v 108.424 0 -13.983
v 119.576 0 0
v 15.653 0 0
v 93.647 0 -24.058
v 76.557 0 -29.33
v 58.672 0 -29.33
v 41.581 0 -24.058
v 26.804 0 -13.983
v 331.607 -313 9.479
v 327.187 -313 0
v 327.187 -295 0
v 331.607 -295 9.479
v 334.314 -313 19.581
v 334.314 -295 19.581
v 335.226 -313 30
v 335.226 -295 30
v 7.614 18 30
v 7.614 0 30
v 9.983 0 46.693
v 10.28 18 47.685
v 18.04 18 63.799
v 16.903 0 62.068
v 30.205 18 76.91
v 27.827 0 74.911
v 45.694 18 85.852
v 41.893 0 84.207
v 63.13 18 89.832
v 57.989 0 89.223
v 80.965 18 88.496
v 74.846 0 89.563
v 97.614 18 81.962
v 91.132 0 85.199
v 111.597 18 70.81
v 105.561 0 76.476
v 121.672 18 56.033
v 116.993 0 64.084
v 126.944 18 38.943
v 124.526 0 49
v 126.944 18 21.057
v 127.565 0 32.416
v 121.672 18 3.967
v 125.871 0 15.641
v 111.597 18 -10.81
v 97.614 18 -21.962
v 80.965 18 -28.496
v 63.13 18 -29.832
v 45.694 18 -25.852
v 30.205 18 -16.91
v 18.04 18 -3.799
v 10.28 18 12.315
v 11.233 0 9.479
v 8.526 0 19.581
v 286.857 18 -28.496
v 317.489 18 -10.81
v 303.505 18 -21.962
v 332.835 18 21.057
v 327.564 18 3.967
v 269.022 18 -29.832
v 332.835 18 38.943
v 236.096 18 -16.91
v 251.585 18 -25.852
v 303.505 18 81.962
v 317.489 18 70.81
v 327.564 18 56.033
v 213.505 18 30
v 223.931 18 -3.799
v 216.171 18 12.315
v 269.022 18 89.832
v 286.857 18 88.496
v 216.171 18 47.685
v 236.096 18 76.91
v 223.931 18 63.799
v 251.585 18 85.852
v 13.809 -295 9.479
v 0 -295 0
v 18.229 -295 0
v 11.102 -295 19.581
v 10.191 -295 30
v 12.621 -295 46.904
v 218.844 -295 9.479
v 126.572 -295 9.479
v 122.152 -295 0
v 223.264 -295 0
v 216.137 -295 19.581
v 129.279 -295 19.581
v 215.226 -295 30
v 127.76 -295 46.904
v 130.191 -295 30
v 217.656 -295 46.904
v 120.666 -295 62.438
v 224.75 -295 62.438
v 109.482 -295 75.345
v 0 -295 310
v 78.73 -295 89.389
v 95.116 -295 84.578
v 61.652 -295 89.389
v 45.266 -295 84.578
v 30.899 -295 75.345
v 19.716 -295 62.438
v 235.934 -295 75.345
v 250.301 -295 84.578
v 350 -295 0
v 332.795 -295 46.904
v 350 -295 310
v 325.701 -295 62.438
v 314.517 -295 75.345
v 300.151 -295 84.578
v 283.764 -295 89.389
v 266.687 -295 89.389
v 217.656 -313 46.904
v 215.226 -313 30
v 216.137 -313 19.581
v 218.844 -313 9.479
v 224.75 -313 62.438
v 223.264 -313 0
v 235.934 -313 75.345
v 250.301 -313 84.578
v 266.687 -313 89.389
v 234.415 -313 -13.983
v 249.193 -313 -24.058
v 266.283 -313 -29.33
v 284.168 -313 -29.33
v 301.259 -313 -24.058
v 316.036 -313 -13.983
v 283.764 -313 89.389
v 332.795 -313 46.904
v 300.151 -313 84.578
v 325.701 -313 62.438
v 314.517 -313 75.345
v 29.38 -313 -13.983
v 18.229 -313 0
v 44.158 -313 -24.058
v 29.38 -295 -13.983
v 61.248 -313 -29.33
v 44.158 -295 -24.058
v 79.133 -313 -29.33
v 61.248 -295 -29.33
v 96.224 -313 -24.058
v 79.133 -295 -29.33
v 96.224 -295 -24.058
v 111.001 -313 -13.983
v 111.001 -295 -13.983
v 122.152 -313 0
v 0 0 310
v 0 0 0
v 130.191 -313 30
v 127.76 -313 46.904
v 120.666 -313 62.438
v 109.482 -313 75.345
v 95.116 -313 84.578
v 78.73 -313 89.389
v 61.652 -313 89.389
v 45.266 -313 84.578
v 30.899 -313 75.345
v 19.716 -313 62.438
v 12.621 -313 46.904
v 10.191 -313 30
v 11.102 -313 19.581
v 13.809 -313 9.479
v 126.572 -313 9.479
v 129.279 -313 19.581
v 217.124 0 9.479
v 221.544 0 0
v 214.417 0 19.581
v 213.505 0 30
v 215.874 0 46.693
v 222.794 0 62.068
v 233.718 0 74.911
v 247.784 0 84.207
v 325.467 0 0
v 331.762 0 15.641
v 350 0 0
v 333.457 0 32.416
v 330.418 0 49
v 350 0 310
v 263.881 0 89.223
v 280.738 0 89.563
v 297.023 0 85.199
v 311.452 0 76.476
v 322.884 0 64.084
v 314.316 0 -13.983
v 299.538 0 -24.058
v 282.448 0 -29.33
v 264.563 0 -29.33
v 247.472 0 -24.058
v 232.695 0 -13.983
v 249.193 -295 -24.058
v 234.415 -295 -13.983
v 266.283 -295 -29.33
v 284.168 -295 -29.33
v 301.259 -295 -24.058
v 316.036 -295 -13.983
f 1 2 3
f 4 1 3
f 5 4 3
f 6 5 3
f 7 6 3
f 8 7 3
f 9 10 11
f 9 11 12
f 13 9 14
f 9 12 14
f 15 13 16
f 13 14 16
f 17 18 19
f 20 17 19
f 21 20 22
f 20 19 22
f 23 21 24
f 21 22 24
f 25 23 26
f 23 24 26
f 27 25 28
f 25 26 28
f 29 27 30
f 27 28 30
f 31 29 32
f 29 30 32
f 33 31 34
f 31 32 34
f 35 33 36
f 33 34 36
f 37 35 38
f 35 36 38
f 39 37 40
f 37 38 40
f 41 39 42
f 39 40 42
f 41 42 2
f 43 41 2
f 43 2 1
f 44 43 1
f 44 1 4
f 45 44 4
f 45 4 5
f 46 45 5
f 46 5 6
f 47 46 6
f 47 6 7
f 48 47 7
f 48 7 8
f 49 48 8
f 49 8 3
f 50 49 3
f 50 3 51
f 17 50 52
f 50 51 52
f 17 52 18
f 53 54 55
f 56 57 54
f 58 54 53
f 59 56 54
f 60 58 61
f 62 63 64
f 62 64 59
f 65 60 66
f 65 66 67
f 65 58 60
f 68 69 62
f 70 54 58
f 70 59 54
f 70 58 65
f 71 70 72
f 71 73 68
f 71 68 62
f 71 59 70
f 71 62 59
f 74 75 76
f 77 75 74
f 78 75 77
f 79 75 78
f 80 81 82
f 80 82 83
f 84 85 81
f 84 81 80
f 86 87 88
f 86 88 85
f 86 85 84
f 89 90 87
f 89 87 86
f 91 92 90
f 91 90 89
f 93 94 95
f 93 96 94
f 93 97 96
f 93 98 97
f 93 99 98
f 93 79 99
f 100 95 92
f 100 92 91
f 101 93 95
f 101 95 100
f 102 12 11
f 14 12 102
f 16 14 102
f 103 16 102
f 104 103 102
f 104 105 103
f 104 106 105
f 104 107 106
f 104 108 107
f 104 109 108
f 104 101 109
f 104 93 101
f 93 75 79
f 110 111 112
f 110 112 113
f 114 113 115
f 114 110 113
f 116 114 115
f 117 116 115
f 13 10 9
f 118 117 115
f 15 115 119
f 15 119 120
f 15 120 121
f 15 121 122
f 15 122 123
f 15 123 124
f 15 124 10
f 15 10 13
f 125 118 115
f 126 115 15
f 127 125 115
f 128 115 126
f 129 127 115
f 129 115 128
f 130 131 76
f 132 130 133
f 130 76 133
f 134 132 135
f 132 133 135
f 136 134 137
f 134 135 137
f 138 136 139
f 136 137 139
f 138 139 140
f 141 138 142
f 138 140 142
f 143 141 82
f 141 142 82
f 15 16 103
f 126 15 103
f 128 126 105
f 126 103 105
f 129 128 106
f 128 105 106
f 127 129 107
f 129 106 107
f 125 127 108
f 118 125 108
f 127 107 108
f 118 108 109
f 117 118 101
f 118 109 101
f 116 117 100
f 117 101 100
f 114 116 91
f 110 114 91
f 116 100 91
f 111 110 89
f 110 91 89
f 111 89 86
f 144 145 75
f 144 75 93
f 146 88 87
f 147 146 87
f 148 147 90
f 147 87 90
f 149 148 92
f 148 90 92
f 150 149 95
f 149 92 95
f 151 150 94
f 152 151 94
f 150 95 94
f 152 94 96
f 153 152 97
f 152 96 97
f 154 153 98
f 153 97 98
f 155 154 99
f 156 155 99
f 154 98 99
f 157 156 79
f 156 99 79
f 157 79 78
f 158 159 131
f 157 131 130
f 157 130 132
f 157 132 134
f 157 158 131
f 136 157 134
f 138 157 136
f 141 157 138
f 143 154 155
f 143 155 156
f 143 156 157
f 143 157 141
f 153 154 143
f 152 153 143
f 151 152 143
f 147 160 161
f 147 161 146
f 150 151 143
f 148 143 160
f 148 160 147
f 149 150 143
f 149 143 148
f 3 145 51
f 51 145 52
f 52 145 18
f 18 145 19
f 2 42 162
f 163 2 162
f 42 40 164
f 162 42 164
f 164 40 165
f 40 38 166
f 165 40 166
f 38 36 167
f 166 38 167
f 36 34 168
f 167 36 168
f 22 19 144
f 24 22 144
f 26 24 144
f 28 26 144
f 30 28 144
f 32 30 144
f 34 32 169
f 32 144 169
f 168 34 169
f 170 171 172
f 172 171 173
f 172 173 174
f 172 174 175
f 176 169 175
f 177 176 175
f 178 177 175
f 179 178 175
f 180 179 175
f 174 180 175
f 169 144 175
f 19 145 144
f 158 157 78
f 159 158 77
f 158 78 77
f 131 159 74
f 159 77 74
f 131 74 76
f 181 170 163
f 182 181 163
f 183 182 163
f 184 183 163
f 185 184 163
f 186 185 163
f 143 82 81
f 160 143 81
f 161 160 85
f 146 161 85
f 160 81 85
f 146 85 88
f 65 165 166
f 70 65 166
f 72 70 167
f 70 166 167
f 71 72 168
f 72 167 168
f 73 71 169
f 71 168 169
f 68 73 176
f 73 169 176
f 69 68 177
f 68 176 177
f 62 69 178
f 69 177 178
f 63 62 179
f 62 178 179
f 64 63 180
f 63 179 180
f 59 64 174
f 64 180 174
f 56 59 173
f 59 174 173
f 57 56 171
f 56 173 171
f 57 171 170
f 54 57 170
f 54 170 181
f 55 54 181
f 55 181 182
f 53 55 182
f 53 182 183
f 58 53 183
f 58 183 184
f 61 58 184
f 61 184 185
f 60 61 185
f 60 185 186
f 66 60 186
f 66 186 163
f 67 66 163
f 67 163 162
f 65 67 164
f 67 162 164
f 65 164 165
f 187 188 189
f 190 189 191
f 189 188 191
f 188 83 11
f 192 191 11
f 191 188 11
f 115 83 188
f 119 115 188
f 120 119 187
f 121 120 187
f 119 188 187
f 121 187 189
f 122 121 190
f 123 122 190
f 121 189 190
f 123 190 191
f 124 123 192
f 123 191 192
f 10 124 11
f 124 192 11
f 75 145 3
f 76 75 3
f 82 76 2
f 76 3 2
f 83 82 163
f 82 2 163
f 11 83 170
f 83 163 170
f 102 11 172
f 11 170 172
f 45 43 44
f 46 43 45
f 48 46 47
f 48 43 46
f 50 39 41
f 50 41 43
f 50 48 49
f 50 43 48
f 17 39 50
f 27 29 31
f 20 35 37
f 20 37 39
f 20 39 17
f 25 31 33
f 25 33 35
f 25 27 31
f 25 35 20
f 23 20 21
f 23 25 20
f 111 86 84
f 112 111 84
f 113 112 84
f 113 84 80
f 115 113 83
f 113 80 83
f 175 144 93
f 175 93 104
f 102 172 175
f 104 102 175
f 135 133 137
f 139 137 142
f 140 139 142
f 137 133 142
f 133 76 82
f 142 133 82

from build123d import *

# Parameters (mm, degrees)
F0_W     = 350
F0_H     = 310
F1_DEPTH = 295
F3_DEPTH = 18
F5_DEPTH = 18


with BuildPart() as f1:
    # F0 (on Front) → F1 (new body)
    with BuildSketch(Plane.XZ):
        with Locations((175, 155)):
            Rectangle(F0_W, F0_H)
    extrude(amount=F1_DEPTH)

    # F2 (on face) → F3 (join)
    with BuildSketch(Plane.XZ.offset(295)):
        with BuildLine():
            ThreePointArc((18.2292630883, 0), (70.1907873154, -30), (122.1523115424, 0))
            Line((122.1523115424, 0), (18.2292630883, 0))
        make_face()
        with BuildLine():
            ThreePointArc((223.2640853139, 0), (275.2256095409, -30), (327.187133768, 0))
            Line((327.187133768, 0), (223.2640853139, 0))
        make_face()
        with BuildLine():
            ThreePointArc((122.1523115424, 0), (128.1463368927, 14.4708572938), (130.1907873154, 30))
            Line((130.1907873154, 30), (10.1907873154, 30))
            ThreePointArc((10.1907873154, 30), (12.235237738, 14.4708572938), (18.2292630883, 0))
            Line((18.2292630883, 0), (122.1523115424, 0))
        make_face()
        with BuildLine():
            ThreePointArc((327.187133768, 0), (333.1811591183, 14.4708572938), (335.2256095409, 30))
            Line((335.2256095409, 30), (215.2256095409, 30))
            ThreePointArc((215.2256095409, 30), (217.2700599636, 14.4708572938), (223.2640853139, 0))
            Line((223.2640853139, 0), (327.187133768, 0))
        make_face()
        with BuildLine():
            Line((10.1907873154, 30), (130.1907873154, 30))
            ThreePointArc((130.1907873154, 30), (70.1907873154, 90), (10.1907873154, 30))
        make_face()
        with BuildLine():
            Line((215.2256095409, 30), (335.2256095409, 30))
            ThreePointArc((335.2256095409, 30), (275.2256095409, 90), (215.2256095409, 30))
        make_face()
    extrude(amount=F3_DEPTH)

    # F4 (on face) → F5 (join)
    with BuildSketch(Plane(origin=(0, 0, 0), x_dir=(-1, 0, 0), z_dir=(0, 1, 0))):
        with BuildLine():
            ThreePointArc((-127.6141306758, 30), (-67.6141306758, -30), (-7.6141306758, 30))
            Line((-7.6141306758, 30), (-127.6141306758, 30))
        make_face()
        with BuildLine():
            Line((-127.6141306758, 30), (-7.6141306758, 30))
            ThreePointArc((-7.6141306758, 30), (-67.6141306758, 90), (-127.6141306758, 30))
        make_face()
        with BuildLine():
            ThreePointArc((-333.5054194927, 30), (-273.5054194927, -30), (-213.5054194927, 30))
            Line((-213.5054194927, 30), (-333.5054194927, 30))
        make_face()
        with BuildLine():
            Line((-333.5054194927, 30), (-213.5054194927, 30))
            ThreePointArc((-213.5054194927, 30), (-273.5054194927, 90), (-333.5054194927, 30))
        make_face()
    extrude(amount=F5_DEPTH)


solid = f1.part
